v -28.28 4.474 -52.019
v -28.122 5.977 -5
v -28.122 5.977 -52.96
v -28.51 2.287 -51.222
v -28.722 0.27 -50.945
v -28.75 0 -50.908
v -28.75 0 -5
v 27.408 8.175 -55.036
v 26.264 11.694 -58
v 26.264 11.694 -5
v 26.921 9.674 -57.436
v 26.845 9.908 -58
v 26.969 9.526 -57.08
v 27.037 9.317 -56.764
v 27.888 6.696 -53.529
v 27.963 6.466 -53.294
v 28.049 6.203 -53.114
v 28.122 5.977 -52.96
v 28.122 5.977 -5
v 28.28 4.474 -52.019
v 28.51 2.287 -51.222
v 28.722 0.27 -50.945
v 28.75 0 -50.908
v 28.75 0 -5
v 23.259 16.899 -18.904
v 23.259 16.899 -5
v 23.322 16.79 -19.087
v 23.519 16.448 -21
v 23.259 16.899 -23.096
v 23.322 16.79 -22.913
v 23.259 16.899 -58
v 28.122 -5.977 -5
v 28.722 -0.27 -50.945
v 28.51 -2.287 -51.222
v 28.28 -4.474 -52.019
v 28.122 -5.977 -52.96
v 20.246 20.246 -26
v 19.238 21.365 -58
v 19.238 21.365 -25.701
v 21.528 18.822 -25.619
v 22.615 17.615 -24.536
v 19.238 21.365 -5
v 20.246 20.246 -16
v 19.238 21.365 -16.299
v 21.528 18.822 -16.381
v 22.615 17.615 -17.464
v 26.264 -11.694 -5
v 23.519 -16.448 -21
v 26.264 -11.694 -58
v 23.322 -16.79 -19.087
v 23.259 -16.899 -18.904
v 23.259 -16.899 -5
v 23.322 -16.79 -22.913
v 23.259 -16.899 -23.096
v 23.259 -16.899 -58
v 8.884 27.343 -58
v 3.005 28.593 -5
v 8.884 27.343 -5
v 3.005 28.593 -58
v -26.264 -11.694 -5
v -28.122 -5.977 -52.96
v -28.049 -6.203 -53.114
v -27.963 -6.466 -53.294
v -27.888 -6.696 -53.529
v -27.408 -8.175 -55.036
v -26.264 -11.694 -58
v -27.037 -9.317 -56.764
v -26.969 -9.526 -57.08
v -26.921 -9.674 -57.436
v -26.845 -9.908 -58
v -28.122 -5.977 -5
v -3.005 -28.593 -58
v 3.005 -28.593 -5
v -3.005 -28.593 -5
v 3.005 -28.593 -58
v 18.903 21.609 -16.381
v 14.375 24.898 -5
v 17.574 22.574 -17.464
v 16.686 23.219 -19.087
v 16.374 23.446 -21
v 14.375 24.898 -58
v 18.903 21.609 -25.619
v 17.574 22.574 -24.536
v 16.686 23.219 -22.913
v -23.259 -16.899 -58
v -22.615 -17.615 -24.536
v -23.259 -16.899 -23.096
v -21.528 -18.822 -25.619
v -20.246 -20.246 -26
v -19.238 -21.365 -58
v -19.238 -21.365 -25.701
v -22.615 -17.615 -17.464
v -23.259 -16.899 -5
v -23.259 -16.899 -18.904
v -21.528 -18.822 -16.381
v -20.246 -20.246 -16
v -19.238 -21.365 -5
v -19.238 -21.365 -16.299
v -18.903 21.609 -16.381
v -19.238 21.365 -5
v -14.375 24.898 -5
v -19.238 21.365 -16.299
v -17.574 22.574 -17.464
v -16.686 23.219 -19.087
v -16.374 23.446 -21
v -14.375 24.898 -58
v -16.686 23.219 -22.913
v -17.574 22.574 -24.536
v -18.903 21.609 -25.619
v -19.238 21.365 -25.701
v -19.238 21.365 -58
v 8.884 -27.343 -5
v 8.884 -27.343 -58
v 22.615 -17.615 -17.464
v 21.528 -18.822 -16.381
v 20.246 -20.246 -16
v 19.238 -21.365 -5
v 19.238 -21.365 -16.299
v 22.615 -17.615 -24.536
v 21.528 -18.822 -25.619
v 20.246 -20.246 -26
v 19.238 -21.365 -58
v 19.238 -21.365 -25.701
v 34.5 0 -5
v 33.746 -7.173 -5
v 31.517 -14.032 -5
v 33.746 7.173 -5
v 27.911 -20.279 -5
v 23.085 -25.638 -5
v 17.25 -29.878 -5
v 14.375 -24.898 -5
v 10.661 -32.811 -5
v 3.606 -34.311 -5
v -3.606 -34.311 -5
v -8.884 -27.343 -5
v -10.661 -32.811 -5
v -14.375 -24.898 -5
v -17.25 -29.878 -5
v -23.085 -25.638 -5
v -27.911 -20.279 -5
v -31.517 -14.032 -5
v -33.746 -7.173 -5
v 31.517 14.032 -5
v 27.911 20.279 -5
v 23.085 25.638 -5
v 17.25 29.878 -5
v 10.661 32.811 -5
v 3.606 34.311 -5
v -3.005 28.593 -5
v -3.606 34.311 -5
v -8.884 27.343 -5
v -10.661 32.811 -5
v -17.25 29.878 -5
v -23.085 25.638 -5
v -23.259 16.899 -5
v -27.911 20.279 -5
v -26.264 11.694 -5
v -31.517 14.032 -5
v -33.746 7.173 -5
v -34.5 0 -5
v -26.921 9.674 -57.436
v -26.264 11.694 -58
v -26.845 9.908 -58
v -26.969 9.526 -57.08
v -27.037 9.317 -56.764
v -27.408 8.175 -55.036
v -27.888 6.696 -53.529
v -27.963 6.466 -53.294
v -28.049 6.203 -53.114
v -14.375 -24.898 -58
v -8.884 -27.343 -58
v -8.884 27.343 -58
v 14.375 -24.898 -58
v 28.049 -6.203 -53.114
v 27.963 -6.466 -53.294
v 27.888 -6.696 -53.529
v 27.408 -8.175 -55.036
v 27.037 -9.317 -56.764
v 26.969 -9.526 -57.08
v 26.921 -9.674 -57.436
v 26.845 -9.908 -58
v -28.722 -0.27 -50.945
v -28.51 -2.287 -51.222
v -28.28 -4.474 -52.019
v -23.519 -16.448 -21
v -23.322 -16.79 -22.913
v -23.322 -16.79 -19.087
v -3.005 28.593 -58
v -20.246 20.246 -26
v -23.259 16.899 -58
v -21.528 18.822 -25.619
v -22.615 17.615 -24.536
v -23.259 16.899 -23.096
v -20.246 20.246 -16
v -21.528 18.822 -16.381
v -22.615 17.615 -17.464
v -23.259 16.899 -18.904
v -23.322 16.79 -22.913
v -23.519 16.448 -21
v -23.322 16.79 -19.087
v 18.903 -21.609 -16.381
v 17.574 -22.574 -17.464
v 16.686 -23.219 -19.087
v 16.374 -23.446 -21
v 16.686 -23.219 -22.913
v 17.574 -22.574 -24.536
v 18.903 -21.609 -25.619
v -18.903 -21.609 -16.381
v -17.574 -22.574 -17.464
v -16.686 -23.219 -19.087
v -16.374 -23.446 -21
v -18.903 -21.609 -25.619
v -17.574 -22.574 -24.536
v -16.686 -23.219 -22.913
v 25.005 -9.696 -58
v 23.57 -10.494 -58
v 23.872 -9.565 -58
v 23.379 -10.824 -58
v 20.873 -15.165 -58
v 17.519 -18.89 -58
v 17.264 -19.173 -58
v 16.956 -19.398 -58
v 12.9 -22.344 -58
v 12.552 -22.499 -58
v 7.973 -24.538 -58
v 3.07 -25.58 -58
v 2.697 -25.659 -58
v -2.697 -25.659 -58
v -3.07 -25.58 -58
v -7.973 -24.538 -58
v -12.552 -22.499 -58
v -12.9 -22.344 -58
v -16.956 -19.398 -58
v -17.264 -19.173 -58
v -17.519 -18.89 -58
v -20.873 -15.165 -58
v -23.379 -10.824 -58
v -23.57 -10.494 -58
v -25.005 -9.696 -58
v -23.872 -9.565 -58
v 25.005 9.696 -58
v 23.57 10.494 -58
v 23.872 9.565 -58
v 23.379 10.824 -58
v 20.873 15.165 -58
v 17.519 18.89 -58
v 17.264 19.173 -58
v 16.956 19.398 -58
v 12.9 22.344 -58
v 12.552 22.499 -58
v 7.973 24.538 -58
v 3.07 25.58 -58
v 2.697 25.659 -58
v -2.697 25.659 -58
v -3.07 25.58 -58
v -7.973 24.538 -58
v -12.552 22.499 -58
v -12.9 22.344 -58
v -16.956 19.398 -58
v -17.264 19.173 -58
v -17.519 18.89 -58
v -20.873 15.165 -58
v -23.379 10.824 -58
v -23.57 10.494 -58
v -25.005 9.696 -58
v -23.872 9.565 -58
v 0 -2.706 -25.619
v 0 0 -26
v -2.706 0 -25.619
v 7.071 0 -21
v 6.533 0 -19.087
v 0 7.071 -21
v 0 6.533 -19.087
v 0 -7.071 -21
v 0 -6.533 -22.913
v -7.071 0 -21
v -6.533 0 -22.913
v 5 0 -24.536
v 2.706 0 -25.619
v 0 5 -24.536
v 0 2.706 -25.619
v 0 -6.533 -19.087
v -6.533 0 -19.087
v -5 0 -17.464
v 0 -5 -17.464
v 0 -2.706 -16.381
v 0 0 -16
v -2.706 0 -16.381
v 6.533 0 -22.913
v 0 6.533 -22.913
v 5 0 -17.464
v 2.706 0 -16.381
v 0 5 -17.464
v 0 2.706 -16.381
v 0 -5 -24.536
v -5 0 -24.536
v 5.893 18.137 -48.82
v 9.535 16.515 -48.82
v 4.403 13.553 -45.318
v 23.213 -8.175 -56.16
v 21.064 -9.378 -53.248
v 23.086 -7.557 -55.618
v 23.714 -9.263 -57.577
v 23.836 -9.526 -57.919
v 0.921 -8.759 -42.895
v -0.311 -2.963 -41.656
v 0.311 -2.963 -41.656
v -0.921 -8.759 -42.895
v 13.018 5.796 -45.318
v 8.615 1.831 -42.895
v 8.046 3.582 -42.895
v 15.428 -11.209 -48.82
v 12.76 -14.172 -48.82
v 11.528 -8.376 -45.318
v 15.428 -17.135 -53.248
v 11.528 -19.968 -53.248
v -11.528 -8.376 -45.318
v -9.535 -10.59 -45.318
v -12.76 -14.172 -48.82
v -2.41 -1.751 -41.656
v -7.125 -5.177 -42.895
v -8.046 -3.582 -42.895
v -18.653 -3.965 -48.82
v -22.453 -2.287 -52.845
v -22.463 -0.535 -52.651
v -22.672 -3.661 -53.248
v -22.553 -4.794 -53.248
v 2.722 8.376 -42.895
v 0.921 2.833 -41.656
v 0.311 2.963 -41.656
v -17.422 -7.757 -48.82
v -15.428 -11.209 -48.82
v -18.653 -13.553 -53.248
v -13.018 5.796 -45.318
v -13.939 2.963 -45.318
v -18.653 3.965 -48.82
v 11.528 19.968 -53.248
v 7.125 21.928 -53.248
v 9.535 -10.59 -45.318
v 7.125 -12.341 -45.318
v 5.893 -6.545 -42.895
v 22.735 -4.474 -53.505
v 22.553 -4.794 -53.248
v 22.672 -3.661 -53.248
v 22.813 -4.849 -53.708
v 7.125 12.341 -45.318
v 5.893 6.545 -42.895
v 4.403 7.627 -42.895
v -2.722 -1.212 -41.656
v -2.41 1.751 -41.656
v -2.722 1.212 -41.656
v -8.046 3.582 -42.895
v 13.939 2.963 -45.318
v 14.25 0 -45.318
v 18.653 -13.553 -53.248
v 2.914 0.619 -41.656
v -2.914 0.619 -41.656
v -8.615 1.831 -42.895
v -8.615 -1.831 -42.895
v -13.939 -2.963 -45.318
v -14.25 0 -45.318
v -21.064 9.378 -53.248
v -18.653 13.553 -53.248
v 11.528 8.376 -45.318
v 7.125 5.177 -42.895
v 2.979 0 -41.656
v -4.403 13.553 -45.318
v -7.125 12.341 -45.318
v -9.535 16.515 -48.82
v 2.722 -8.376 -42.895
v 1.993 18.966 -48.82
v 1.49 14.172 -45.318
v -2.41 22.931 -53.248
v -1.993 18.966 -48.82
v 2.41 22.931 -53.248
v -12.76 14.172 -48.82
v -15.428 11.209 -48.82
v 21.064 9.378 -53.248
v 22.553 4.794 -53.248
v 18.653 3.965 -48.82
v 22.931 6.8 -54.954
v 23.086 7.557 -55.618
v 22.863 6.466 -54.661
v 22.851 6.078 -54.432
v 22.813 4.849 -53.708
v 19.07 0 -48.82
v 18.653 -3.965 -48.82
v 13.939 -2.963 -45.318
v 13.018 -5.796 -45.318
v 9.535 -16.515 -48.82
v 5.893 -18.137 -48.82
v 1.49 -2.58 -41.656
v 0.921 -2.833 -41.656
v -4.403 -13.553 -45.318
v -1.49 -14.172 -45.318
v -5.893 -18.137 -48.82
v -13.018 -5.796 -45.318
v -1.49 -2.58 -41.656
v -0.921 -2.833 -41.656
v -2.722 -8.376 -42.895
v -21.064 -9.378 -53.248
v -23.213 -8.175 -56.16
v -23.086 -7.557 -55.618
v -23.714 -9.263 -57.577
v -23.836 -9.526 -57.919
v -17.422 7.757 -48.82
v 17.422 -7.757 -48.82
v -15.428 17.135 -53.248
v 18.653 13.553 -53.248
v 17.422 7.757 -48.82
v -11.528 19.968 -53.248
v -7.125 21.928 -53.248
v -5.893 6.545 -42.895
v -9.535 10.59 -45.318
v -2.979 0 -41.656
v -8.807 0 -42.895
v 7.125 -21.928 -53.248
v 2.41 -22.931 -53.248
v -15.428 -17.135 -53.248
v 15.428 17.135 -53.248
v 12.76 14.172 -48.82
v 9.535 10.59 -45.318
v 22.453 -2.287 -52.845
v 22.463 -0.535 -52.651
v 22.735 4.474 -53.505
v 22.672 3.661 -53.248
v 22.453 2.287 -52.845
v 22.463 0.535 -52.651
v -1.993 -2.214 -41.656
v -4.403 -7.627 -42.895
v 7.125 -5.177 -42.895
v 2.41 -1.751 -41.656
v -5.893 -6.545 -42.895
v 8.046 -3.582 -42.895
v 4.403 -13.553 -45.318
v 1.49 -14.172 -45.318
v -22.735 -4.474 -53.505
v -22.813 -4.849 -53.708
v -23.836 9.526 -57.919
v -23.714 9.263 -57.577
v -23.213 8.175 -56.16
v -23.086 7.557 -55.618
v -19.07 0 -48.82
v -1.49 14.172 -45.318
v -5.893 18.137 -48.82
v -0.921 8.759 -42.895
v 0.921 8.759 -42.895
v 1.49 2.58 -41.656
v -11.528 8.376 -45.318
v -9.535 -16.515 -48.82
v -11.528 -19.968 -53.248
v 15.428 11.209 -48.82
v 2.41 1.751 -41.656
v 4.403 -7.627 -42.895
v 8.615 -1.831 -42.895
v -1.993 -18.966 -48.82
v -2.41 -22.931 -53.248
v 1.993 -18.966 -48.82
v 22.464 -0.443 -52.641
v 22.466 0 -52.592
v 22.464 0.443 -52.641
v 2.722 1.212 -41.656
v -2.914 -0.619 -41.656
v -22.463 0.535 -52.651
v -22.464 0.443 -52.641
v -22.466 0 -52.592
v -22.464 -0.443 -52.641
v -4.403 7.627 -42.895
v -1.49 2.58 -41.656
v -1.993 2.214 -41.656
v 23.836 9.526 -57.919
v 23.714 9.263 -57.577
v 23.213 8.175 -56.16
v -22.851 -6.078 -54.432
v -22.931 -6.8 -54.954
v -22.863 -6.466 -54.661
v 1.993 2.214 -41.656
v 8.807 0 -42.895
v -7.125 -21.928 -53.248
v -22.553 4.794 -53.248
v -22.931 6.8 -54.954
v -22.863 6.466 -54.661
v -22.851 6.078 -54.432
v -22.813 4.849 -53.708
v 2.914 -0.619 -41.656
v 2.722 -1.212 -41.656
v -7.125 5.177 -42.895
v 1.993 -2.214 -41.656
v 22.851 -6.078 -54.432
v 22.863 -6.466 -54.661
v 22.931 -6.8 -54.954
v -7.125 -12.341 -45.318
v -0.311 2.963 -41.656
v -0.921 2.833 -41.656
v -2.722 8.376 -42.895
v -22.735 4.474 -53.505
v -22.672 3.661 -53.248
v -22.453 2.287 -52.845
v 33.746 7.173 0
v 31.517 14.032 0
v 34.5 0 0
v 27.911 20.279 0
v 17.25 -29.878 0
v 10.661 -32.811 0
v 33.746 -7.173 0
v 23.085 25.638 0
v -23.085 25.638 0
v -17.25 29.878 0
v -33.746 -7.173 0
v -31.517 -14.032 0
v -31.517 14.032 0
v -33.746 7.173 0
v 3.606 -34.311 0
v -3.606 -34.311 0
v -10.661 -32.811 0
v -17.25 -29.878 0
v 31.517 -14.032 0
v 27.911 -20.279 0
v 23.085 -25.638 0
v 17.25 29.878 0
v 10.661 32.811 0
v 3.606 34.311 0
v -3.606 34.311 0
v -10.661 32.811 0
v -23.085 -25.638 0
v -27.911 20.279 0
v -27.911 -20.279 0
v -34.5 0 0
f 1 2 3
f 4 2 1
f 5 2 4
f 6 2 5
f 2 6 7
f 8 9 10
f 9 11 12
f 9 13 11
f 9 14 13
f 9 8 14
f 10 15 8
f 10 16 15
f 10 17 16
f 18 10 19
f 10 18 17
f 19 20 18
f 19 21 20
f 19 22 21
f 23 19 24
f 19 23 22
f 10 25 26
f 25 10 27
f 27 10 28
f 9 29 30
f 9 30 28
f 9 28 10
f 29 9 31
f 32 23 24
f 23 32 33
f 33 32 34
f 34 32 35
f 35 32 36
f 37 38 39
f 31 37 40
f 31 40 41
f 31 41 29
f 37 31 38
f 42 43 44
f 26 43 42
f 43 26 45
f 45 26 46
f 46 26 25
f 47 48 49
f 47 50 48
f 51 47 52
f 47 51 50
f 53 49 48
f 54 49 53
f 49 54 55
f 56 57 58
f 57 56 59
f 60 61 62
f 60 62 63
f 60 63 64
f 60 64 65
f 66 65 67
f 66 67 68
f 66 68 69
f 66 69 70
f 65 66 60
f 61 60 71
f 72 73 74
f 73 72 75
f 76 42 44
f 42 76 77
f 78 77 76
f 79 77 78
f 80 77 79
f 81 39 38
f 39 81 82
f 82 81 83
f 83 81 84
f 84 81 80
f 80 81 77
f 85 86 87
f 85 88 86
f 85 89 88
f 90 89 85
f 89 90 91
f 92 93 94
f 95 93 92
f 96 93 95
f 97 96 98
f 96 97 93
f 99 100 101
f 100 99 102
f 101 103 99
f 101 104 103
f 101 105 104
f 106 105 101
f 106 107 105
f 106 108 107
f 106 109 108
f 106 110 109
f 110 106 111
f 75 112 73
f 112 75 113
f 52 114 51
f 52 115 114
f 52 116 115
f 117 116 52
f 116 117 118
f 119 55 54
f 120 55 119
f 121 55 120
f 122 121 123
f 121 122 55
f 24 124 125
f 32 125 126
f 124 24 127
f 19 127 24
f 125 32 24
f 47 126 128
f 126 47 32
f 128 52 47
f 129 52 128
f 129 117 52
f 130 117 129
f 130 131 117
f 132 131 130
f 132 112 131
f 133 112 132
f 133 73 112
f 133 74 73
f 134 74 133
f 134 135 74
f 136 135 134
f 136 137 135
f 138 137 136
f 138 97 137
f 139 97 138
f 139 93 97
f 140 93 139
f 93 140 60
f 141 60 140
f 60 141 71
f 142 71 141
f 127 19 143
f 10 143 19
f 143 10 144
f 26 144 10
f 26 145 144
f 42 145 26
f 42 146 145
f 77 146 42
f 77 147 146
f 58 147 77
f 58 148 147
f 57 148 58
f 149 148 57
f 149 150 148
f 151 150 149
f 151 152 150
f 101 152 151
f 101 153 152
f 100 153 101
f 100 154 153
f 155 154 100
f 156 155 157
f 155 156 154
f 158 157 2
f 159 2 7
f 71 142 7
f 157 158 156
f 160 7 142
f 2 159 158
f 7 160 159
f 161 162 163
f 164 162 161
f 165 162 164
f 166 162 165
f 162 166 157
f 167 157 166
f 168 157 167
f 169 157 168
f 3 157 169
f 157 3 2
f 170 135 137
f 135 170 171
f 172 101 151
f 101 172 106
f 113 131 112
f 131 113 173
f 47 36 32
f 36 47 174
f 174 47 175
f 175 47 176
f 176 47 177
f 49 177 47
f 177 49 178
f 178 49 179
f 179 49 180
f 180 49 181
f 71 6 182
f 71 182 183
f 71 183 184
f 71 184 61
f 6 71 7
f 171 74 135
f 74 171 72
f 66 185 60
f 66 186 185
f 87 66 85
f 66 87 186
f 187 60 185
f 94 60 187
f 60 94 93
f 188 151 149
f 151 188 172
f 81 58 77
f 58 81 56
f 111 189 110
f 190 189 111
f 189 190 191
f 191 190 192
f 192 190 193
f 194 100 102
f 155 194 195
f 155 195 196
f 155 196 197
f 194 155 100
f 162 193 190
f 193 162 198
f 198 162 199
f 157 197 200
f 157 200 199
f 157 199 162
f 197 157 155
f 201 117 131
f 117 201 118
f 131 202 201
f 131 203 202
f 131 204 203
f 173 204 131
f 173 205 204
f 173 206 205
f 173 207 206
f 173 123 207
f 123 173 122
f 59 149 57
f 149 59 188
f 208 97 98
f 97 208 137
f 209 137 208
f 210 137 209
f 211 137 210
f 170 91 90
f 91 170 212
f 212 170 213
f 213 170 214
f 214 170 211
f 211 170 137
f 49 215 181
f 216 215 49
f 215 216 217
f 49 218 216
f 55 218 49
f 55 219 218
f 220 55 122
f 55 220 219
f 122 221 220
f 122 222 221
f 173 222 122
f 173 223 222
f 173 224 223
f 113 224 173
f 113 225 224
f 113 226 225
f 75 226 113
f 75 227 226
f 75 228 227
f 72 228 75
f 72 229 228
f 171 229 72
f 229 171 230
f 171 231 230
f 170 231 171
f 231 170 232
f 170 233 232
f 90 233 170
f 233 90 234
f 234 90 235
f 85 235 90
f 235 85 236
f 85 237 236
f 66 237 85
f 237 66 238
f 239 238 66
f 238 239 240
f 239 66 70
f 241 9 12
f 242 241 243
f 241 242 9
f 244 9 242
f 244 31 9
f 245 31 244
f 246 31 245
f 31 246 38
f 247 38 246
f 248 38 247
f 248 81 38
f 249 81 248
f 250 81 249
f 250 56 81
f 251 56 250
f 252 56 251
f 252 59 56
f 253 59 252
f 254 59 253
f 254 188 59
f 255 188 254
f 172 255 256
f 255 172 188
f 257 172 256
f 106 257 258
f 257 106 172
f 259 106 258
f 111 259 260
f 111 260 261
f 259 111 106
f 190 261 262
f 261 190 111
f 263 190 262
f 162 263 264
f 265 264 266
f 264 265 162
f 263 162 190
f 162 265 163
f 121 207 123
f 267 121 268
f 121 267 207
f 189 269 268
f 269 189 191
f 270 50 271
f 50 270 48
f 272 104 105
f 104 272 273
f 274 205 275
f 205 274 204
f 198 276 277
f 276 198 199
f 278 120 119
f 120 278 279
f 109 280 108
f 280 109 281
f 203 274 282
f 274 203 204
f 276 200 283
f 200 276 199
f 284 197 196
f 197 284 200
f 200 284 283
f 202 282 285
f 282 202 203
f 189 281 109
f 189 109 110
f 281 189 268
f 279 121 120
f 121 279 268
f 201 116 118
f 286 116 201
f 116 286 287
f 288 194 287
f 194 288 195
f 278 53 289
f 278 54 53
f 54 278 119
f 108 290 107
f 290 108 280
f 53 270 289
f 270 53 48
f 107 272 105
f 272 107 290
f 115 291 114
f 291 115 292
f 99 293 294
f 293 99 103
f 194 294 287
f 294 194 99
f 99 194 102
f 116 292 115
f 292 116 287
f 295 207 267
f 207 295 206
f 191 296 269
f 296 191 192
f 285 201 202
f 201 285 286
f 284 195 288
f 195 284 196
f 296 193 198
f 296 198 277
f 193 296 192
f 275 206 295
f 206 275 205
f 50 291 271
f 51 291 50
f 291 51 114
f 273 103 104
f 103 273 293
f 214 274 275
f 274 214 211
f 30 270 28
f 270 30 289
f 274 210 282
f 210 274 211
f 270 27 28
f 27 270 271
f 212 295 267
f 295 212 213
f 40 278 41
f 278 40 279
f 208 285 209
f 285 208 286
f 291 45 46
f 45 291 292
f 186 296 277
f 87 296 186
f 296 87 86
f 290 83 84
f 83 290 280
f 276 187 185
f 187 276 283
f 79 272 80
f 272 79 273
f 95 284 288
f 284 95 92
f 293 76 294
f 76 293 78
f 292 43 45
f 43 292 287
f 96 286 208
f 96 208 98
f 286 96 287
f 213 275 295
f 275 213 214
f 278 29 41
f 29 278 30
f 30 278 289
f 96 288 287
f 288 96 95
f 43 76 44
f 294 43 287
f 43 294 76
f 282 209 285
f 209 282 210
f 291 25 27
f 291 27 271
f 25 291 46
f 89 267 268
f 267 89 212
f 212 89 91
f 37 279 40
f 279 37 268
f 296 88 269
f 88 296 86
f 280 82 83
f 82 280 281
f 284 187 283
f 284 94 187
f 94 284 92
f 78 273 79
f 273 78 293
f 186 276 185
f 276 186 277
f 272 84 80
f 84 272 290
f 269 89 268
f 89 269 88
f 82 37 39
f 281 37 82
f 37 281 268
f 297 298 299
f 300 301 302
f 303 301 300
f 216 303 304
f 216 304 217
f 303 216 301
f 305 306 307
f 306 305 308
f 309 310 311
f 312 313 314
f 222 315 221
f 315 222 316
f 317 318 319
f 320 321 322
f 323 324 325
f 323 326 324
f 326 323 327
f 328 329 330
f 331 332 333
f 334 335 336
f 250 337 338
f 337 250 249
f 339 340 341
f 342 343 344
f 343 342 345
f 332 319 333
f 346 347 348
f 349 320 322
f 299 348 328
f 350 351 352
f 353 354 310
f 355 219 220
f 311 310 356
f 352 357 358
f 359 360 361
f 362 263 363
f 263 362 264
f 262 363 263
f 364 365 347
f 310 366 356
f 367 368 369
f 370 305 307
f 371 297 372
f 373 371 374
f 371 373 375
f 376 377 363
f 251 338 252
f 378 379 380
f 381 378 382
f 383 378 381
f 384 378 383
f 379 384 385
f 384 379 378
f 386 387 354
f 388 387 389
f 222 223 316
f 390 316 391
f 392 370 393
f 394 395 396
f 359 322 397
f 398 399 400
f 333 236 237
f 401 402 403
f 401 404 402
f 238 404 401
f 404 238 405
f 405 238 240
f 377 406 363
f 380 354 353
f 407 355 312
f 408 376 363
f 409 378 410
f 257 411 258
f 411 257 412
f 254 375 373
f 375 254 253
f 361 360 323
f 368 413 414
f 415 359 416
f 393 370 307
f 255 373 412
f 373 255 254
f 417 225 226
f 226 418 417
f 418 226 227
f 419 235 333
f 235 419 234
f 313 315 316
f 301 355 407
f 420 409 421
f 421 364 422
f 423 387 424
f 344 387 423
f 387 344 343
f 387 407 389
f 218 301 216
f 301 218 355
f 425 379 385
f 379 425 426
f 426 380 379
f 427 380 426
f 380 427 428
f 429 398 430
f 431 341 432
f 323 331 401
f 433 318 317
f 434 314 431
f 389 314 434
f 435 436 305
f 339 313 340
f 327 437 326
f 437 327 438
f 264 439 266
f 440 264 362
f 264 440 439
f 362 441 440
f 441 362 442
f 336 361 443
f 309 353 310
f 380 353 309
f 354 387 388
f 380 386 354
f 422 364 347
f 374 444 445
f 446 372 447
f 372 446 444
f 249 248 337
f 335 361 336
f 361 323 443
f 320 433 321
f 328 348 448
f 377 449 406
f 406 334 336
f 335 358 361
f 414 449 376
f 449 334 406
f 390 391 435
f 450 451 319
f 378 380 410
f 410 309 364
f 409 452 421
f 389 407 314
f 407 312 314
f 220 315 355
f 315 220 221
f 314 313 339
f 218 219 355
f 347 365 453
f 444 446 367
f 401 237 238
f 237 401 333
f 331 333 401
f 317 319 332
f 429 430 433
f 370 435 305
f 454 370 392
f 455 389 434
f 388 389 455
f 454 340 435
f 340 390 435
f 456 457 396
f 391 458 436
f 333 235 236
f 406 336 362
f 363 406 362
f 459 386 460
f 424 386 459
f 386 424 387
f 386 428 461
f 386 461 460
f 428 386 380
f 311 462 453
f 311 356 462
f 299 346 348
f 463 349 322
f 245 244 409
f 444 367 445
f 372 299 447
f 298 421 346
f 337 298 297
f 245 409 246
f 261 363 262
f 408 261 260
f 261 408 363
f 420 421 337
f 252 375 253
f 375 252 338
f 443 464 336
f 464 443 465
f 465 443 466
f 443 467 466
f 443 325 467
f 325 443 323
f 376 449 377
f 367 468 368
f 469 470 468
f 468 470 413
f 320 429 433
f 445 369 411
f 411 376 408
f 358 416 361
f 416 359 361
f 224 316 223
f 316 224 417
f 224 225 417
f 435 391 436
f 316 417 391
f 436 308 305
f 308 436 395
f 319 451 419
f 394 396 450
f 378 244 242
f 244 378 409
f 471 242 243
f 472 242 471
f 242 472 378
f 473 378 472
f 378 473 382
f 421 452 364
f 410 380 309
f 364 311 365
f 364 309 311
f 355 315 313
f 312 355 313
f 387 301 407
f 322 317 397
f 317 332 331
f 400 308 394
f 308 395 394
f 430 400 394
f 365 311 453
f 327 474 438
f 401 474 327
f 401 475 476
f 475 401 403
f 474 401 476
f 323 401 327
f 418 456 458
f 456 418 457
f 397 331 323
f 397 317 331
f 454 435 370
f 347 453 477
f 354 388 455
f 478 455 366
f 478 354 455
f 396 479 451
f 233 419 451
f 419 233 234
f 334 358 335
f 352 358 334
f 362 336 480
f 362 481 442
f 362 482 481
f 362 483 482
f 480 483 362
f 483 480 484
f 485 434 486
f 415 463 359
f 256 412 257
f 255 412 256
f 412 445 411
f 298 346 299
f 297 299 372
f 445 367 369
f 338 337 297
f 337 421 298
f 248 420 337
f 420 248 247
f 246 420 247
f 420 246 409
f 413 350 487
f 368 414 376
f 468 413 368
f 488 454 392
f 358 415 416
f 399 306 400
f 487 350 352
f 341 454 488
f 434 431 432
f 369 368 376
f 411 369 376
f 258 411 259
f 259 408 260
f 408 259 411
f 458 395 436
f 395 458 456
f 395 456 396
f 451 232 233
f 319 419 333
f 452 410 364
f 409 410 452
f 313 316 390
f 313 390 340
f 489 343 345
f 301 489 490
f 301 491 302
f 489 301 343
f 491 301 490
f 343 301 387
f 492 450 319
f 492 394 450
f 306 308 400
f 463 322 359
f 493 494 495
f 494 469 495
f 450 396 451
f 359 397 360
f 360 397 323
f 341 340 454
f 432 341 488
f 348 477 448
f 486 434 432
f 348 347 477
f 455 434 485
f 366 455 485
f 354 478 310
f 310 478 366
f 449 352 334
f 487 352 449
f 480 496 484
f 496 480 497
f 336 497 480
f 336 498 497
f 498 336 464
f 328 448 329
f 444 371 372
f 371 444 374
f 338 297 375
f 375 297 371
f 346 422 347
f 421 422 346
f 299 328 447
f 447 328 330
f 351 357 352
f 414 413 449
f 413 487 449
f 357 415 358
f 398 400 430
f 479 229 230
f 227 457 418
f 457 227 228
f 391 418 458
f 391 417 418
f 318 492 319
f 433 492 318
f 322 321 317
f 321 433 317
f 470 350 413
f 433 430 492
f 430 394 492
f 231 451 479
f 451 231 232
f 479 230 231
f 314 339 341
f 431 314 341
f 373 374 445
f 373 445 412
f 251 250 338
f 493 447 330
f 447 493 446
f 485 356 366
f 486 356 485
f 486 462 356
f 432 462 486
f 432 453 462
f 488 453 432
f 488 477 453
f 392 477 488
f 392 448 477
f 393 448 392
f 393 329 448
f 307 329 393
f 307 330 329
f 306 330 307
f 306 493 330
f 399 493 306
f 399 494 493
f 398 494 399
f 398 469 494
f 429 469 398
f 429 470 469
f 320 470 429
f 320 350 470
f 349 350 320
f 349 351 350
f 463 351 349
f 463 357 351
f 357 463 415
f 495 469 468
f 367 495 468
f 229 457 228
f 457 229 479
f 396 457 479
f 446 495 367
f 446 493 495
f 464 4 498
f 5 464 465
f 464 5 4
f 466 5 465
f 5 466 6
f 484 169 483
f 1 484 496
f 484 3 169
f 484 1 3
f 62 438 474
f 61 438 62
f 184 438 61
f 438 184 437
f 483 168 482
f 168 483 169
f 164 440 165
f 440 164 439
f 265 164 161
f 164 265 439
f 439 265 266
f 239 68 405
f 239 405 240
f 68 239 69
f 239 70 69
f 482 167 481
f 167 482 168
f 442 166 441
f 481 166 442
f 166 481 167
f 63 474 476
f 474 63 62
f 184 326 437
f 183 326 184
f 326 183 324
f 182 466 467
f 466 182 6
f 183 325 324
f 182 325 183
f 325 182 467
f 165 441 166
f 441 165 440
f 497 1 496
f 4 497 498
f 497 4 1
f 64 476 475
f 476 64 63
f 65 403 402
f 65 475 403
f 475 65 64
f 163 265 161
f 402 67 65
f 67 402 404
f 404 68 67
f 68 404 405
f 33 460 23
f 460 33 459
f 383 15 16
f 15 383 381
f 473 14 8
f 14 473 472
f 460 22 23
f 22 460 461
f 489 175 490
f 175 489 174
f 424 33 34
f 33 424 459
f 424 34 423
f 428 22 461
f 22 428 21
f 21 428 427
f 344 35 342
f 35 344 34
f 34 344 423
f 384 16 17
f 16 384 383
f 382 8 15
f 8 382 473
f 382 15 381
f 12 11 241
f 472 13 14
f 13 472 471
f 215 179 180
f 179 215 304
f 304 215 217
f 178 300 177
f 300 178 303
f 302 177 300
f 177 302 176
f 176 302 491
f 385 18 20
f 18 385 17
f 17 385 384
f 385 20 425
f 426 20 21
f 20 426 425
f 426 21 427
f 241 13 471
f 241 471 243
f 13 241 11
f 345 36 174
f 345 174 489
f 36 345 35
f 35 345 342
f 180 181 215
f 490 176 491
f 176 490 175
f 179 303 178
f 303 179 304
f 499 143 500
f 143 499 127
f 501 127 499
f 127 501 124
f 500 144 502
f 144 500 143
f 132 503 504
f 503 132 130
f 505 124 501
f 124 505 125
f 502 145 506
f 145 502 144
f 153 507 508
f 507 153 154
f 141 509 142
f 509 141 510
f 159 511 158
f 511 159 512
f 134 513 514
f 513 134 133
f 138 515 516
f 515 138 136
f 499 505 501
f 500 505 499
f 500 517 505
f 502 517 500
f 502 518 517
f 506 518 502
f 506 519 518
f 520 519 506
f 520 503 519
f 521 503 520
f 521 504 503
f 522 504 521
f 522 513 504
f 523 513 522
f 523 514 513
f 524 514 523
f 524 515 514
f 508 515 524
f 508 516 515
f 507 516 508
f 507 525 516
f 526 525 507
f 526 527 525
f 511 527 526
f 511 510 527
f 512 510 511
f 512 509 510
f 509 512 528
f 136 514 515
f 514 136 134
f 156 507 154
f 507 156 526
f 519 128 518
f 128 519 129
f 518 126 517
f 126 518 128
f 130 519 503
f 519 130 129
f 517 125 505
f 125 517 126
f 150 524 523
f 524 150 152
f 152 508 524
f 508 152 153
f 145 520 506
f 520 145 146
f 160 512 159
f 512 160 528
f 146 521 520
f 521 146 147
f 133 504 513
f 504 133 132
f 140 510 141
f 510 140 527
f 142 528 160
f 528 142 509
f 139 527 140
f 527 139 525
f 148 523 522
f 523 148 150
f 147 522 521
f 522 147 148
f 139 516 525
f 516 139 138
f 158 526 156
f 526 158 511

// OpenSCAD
Shpor();

/*

    Расстояние от верха шпора до центра вырезанной сферы: 70




*/

shporH = 53;
shporDia = 57.5;
holeDia = 10;
mastDia = 69;

sphereDia = 57;
cutCylDia = 22;
sphereOffset = 12;


module Shpor() {

    translate([0,0,-shporH/2-5])  {

    difference() {
        cylinder(h=shporH,d=shporDia,center=true);
    
        dz = shporH/2-holeDia/2-11;

        translate([0,0,dz]) rotate([0,0,45]) rotate([90,0,0]) cylinder(h=shporDia+10,d=holeDia,center=true);
        translate([0,0,dz]) rotate([0,0,-45]) rotate([90,0,0]) cylinder(h=shporDia+10,d=holeDia,center=true);

        translate([0,0,-sphereOffset -shporH/2]) sphere(d = sphereDia);    




        tempH = sphereDia*1.5;
        tempdz = - shporH/2 - sphereOffset;
        translate([0,0, tempdz])     rotate([0,-75,0]) cylinder(h=tempH,d=cutCylDia,center=true);
        translate([0,0, tempdz])     rotate([0, 75,0]) cylinder(h=tempH,d=cutCylDia,center=true);

    }
    
    shimH = 5;
    translate([0,0,shimH/2 + shporH/2]) cylinder(h=shimH,d=mastDia,center=true);
    

    }


}
